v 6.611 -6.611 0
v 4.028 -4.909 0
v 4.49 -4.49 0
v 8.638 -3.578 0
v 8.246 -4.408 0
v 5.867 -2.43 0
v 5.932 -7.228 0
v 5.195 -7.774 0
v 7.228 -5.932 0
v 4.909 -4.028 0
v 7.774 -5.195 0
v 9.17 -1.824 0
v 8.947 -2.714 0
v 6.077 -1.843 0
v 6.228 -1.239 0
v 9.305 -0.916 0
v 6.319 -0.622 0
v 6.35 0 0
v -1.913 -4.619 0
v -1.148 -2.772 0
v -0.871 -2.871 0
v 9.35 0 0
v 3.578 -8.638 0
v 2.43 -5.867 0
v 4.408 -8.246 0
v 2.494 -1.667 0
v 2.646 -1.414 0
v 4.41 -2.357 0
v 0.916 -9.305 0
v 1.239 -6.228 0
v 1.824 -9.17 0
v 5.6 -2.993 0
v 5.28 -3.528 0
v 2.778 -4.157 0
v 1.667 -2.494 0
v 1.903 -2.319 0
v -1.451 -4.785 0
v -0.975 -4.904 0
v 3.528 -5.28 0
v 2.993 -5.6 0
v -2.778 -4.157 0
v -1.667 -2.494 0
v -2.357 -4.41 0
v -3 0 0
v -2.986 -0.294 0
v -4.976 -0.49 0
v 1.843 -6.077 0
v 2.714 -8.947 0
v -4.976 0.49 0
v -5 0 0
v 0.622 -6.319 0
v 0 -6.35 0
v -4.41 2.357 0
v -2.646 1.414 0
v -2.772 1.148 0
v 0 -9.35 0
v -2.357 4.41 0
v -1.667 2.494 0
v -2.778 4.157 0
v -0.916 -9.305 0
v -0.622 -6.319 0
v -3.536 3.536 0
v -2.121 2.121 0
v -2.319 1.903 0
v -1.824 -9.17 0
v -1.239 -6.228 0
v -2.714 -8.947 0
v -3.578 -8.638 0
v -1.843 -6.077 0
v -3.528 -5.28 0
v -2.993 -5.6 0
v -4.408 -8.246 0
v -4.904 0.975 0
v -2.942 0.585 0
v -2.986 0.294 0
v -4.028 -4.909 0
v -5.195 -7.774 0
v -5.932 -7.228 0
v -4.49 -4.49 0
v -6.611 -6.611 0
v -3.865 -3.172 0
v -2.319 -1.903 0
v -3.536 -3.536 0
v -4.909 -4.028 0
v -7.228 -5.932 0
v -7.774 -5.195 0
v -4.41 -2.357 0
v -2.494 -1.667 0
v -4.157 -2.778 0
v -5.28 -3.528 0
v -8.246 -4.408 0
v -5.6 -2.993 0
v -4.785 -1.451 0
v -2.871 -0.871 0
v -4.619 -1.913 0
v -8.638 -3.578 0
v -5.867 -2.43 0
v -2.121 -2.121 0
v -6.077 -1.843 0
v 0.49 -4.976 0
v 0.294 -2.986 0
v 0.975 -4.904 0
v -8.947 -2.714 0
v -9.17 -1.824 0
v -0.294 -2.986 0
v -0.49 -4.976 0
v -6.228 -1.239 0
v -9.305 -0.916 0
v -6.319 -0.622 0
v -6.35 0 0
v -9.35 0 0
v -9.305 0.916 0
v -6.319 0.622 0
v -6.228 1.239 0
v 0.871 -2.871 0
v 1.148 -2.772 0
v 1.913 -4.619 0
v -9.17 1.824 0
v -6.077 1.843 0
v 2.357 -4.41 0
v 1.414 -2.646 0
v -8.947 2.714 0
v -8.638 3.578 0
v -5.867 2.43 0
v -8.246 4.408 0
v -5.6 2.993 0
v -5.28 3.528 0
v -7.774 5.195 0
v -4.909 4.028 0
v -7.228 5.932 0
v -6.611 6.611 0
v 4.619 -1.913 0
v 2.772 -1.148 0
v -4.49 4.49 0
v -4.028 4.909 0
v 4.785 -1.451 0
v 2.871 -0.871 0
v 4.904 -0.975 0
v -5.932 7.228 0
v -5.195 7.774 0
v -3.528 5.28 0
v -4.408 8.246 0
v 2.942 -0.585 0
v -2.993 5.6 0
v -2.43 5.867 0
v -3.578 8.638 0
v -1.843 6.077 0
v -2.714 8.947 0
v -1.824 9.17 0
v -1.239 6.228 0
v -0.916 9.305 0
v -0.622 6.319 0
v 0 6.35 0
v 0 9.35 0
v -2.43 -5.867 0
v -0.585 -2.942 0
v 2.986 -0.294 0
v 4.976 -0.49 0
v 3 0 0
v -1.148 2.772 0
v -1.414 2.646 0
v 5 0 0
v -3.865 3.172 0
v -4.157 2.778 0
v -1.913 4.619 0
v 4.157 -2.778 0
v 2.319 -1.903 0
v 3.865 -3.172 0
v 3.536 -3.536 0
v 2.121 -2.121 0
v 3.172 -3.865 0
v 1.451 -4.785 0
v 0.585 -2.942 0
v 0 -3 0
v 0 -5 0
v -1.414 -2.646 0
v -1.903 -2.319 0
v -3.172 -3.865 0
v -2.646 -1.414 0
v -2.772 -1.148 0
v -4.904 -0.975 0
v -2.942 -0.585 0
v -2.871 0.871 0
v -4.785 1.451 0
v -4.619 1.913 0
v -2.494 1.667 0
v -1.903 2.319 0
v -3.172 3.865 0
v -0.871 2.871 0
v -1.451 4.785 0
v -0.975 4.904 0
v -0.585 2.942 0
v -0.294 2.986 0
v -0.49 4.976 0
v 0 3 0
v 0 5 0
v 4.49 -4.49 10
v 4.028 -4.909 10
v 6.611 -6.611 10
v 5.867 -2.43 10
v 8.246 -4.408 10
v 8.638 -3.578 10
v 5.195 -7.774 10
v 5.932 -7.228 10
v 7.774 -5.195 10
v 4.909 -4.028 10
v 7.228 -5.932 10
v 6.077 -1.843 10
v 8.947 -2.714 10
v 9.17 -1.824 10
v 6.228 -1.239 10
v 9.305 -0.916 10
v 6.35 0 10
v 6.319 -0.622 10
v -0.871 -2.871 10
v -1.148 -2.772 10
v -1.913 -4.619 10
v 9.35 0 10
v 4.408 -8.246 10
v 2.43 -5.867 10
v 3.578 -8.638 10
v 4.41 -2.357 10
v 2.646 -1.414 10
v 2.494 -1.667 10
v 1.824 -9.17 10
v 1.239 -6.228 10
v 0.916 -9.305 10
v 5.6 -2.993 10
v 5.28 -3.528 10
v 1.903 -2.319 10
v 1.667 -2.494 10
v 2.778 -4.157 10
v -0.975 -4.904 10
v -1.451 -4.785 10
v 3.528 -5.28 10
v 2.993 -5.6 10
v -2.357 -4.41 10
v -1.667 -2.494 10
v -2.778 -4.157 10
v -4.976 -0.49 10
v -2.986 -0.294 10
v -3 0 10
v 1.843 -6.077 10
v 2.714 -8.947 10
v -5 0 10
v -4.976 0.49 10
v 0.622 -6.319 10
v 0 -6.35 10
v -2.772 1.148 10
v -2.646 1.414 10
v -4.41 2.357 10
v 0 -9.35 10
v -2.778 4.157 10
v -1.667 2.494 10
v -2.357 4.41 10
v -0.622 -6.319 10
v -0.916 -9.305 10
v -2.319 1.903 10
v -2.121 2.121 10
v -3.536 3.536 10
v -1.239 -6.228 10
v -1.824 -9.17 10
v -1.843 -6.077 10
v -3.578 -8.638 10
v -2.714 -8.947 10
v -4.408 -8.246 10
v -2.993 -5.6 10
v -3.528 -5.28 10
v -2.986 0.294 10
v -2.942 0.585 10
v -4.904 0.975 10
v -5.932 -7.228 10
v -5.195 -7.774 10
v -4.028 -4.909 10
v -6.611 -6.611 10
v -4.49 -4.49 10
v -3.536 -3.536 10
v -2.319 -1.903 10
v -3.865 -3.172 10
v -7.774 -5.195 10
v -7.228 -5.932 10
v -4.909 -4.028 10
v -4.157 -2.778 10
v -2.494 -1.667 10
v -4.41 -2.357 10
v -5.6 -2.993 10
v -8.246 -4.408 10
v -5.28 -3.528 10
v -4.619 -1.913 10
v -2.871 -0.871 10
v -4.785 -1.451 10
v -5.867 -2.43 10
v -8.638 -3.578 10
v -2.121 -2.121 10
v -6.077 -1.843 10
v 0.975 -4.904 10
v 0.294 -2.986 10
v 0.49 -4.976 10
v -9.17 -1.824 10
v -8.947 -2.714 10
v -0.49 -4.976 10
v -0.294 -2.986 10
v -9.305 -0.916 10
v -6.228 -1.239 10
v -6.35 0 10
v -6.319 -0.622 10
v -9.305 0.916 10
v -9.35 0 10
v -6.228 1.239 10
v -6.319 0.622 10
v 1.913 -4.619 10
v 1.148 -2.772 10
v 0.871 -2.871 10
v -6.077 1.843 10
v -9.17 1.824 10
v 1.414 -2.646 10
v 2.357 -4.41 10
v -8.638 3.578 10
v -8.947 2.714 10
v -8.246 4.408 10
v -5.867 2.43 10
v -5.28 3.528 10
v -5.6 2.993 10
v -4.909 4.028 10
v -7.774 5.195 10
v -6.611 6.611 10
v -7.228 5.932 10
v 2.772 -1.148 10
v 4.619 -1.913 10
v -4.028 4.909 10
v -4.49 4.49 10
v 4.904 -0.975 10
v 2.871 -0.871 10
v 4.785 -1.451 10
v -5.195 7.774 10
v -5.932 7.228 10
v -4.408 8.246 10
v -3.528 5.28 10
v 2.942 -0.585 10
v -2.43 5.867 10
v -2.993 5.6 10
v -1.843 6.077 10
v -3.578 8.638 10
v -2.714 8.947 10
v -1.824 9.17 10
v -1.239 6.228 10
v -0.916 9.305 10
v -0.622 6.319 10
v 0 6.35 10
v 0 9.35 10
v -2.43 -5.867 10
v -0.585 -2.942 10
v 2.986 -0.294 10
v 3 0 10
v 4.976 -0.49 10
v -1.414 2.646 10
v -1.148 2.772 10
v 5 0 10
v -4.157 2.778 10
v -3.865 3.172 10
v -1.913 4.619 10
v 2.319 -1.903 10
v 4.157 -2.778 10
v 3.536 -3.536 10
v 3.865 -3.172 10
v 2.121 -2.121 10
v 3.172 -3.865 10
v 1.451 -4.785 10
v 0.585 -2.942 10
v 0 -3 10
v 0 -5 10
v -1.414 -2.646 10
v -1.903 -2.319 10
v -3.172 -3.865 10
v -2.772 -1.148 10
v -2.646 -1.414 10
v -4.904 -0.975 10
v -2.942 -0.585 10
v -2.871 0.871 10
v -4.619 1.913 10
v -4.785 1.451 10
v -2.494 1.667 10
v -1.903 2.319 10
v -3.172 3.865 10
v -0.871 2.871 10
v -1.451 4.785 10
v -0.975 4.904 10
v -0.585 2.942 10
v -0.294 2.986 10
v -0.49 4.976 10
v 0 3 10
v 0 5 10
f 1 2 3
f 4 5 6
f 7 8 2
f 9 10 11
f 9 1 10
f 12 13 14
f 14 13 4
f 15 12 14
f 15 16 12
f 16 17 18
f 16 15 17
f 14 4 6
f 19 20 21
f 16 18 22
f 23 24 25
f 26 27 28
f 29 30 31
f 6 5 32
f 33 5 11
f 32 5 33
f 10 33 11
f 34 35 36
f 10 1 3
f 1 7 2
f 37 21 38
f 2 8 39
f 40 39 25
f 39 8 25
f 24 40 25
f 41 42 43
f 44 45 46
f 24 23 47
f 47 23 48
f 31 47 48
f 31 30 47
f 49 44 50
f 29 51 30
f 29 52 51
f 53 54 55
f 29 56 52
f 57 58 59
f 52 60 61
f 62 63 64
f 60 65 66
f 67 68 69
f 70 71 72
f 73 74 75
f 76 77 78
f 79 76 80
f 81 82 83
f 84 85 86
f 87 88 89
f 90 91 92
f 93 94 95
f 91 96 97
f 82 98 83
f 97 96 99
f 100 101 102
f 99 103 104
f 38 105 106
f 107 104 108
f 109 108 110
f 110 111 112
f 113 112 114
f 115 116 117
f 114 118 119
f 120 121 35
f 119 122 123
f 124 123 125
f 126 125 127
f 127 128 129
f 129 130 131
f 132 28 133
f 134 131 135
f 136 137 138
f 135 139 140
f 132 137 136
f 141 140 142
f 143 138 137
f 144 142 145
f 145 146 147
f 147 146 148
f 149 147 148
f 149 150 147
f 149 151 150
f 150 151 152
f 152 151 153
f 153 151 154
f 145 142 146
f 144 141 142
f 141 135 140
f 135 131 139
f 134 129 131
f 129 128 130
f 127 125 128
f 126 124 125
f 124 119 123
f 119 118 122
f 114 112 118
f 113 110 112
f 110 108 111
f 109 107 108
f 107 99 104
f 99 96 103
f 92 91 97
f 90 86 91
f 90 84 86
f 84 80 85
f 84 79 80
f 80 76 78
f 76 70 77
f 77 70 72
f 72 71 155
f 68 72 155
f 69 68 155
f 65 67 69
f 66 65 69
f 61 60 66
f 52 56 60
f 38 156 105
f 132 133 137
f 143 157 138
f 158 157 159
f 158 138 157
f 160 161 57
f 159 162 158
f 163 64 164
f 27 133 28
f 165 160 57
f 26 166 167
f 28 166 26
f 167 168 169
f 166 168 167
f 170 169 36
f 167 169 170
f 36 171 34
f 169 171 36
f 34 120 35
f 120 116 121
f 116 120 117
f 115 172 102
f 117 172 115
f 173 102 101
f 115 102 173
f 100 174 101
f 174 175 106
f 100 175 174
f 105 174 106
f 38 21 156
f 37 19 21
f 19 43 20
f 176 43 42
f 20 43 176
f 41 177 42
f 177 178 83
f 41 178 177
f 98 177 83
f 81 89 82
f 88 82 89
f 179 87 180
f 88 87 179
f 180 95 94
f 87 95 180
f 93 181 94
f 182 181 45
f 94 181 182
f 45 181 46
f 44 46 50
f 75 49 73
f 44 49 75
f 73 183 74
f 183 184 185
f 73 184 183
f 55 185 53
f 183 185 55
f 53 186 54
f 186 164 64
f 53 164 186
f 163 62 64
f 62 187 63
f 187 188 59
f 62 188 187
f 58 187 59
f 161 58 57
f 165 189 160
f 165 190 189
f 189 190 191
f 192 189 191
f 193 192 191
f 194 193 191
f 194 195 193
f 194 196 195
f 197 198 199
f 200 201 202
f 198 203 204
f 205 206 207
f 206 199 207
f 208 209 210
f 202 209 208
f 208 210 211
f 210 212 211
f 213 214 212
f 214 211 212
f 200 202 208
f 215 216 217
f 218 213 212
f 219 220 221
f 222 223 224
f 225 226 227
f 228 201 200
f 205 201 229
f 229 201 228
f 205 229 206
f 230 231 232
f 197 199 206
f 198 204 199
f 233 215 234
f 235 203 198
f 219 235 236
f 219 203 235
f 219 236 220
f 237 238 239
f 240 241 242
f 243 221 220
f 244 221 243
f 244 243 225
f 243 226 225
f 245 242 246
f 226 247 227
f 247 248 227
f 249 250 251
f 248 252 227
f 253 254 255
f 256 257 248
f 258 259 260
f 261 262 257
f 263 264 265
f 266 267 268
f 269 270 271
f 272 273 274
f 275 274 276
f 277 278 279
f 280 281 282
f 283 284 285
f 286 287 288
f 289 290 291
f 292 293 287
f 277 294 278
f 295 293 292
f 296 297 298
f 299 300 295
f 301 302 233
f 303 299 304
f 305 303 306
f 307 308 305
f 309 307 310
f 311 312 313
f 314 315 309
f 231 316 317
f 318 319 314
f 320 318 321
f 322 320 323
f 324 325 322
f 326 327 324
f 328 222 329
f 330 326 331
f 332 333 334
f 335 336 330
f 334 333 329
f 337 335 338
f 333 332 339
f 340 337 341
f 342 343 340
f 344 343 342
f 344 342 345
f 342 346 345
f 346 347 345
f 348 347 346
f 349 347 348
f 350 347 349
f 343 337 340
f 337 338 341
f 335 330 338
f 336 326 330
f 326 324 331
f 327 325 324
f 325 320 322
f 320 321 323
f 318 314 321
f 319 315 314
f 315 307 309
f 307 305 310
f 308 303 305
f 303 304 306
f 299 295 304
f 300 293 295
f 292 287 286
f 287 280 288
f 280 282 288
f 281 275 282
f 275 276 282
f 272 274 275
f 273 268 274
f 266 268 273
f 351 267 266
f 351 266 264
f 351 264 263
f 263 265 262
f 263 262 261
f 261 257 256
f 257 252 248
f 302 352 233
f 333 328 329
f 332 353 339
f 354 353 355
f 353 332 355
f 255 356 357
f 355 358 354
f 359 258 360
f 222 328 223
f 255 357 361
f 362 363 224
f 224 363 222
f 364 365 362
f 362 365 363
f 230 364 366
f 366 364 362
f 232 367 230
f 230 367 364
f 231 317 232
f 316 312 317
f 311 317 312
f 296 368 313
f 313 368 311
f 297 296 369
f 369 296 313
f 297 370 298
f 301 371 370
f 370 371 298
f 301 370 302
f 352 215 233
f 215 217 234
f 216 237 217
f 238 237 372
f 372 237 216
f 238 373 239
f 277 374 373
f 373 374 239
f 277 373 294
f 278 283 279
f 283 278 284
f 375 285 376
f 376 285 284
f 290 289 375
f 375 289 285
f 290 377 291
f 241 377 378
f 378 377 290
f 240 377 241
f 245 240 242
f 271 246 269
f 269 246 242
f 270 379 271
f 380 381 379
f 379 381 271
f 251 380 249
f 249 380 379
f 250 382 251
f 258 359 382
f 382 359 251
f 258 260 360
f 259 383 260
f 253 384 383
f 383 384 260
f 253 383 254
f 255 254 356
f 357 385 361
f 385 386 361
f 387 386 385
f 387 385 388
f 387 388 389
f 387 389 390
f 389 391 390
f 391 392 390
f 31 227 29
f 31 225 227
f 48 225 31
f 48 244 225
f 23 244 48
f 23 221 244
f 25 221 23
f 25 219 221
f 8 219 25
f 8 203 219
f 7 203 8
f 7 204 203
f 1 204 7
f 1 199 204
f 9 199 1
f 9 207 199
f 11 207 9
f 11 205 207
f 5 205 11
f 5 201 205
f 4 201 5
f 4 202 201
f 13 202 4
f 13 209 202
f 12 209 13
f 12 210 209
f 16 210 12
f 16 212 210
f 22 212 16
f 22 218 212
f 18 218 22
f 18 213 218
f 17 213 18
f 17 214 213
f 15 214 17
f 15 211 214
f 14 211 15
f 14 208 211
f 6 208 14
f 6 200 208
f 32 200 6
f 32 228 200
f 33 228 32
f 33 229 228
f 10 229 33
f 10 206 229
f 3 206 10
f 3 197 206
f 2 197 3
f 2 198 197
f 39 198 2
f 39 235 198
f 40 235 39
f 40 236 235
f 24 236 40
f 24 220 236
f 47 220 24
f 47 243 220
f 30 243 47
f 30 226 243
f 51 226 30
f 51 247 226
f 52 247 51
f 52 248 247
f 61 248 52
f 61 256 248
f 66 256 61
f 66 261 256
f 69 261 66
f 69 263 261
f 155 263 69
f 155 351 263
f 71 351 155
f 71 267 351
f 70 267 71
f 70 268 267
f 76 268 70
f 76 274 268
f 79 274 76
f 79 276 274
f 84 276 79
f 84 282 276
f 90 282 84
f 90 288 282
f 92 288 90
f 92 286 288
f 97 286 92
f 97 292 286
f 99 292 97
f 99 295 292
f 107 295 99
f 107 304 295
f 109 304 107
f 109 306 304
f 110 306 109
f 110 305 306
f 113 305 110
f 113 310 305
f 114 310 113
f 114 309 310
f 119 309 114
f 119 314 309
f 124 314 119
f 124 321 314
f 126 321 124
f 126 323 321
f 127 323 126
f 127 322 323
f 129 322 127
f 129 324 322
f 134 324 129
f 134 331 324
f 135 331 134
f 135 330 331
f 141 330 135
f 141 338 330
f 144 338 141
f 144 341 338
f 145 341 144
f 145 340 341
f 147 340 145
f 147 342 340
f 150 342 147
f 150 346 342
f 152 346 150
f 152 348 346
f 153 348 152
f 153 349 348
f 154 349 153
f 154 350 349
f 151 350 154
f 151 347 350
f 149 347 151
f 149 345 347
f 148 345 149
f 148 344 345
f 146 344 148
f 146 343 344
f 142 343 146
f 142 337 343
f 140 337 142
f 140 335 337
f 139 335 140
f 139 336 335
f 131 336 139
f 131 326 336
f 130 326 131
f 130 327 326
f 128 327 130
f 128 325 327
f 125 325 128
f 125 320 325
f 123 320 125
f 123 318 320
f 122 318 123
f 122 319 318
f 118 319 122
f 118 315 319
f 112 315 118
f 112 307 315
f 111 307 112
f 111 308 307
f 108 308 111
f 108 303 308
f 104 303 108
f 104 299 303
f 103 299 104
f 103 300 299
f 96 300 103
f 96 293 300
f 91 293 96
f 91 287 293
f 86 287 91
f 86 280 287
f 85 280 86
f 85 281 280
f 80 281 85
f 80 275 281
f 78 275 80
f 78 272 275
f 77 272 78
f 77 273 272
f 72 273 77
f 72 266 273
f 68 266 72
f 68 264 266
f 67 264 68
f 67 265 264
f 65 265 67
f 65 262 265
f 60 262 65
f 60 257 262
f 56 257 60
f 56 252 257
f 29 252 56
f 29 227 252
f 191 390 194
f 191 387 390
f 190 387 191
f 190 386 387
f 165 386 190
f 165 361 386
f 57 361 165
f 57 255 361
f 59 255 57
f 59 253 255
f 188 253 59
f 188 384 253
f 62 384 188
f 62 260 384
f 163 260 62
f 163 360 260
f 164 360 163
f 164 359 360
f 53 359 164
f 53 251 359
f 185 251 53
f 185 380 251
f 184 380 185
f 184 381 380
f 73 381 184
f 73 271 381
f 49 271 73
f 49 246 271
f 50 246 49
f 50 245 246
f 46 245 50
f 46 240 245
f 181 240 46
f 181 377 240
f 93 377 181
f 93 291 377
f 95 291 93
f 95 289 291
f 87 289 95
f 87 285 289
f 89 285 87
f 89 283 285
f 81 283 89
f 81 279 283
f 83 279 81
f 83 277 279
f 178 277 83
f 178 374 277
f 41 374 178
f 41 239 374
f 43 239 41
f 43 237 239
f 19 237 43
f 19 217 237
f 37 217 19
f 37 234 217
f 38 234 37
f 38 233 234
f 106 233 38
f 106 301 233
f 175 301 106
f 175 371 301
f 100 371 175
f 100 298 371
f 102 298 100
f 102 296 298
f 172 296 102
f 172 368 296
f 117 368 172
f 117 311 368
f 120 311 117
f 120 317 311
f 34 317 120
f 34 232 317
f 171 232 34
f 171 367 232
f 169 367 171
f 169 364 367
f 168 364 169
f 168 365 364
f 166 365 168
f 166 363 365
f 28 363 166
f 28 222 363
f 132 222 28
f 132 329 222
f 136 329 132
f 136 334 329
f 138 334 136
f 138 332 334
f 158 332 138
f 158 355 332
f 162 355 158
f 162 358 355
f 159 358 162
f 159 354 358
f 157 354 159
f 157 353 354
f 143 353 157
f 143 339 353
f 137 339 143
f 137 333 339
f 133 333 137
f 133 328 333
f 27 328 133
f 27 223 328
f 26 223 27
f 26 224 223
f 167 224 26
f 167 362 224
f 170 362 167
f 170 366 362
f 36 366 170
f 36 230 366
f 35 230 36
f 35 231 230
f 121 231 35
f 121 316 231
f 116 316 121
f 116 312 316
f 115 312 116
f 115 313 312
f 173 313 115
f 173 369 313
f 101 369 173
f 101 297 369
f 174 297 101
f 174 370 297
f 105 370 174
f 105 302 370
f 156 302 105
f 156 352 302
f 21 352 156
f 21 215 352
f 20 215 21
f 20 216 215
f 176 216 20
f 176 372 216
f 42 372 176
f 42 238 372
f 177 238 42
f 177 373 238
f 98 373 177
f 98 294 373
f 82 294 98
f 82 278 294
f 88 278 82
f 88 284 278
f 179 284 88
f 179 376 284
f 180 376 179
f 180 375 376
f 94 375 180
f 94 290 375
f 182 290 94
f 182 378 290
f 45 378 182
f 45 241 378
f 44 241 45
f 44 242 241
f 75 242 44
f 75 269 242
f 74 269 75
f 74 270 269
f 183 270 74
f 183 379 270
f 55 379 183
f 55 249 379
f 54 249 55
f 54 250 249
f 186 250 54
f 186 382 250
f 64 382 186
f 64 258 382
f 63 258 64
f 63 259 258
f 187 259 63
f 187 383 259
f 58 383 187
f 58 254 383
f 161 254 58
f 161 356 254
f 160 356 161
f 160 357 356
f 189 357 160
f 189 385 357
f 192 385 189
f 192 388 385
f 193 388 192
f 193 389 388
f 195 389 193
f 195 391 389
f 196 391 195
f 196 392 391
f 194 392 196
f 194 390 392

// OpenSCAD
// Dimensions for the snap-on clip
// Rod specifications
rod_id = 12.7; // Inner diameter of the rod ring (1/2 inch)
rod_wall = 3;   // Wall thickness of the rod ring
rod_od = rod_id + 2 * rod_wall; // Outer diameter of the rod ring (18.7 mm)
rod_center_x = 0; // X position of the rod ring center
rod_center_y = 0; // Y position of the rod ring center

// Tubing specifications
tubing_id = 6; // Inner diameter of the tubing ring
tubing_wall = 2; // Wall thickness of the tubing ring
tubing_od = tubing_id + 2 * tubing_wall; // Outer diameter of the tubing ring (10 mm)
tubing_center_x = 15; // X position of the tubing ring center
tubing_center_y = 0; // Y position of the tubing ring center

// Bridge specifications
bridge_x1 = 8; // Left X coordinate of the bridge
bridge_x2 = 12; // Right X coordinate of the bridge
bridge_width_y = 6; // Width of the bridge in Y direction

// Opening specifications
rod_opening_y_half = 5; // Half-width of the opening on the rod ring
tubing_opening_y_half = 2.25; // Half-width of the opening on the tubing ring

// Print orientation
print_height = 10; // Height of the extrusion in Z direction

// $fn for curved shapes to ensure roundness
$fn = 64;

// Main part construction - 2D profile extruded to 3D
linear_extrude(height = print_height) {
    difference() {
        // Union of all 2D shapes
        union() {
            // 1. Rod Ring (2D)
            difference() {
                circle(r = rod_od / 2);
                circle(r = rod_id / 2);
            }
            translate([rod_center_x, rod_center_y]);
            
            // 2. Tubing Ring (2D)
            difference() {
                circle(r = tubing_od / 2);
                circle(r = tubing_id / 2);
            }
            translate([tubing_center_x, tubing_center_y]);
            
            // 3. Solid Bridge (2D)
            square([bridge_x2 - bridge_x1, bridge_width_y]);
            translate([bridge_x1 + (bridge_x2 - bridge_x1) / 2, 0]);
        }
        
        // Cutout 1: -X side of rod ring (x < 0, -5 < y < 5)
        // Box extends past the ring face to satisfy Rule 5
        square([20, rod_opening_y_half * 2]);
        translate([-10, 0]);
        
        // Cutout 2: +X side of tubing ring (x > 15, -2.25 < y < 2.25)
        // Box extends past the ring face to satisfy Rule 5
        square([10, tubing_opening_y_half * 2]);
        translate([tubing_center_x + 5, 0]);
    }
}
